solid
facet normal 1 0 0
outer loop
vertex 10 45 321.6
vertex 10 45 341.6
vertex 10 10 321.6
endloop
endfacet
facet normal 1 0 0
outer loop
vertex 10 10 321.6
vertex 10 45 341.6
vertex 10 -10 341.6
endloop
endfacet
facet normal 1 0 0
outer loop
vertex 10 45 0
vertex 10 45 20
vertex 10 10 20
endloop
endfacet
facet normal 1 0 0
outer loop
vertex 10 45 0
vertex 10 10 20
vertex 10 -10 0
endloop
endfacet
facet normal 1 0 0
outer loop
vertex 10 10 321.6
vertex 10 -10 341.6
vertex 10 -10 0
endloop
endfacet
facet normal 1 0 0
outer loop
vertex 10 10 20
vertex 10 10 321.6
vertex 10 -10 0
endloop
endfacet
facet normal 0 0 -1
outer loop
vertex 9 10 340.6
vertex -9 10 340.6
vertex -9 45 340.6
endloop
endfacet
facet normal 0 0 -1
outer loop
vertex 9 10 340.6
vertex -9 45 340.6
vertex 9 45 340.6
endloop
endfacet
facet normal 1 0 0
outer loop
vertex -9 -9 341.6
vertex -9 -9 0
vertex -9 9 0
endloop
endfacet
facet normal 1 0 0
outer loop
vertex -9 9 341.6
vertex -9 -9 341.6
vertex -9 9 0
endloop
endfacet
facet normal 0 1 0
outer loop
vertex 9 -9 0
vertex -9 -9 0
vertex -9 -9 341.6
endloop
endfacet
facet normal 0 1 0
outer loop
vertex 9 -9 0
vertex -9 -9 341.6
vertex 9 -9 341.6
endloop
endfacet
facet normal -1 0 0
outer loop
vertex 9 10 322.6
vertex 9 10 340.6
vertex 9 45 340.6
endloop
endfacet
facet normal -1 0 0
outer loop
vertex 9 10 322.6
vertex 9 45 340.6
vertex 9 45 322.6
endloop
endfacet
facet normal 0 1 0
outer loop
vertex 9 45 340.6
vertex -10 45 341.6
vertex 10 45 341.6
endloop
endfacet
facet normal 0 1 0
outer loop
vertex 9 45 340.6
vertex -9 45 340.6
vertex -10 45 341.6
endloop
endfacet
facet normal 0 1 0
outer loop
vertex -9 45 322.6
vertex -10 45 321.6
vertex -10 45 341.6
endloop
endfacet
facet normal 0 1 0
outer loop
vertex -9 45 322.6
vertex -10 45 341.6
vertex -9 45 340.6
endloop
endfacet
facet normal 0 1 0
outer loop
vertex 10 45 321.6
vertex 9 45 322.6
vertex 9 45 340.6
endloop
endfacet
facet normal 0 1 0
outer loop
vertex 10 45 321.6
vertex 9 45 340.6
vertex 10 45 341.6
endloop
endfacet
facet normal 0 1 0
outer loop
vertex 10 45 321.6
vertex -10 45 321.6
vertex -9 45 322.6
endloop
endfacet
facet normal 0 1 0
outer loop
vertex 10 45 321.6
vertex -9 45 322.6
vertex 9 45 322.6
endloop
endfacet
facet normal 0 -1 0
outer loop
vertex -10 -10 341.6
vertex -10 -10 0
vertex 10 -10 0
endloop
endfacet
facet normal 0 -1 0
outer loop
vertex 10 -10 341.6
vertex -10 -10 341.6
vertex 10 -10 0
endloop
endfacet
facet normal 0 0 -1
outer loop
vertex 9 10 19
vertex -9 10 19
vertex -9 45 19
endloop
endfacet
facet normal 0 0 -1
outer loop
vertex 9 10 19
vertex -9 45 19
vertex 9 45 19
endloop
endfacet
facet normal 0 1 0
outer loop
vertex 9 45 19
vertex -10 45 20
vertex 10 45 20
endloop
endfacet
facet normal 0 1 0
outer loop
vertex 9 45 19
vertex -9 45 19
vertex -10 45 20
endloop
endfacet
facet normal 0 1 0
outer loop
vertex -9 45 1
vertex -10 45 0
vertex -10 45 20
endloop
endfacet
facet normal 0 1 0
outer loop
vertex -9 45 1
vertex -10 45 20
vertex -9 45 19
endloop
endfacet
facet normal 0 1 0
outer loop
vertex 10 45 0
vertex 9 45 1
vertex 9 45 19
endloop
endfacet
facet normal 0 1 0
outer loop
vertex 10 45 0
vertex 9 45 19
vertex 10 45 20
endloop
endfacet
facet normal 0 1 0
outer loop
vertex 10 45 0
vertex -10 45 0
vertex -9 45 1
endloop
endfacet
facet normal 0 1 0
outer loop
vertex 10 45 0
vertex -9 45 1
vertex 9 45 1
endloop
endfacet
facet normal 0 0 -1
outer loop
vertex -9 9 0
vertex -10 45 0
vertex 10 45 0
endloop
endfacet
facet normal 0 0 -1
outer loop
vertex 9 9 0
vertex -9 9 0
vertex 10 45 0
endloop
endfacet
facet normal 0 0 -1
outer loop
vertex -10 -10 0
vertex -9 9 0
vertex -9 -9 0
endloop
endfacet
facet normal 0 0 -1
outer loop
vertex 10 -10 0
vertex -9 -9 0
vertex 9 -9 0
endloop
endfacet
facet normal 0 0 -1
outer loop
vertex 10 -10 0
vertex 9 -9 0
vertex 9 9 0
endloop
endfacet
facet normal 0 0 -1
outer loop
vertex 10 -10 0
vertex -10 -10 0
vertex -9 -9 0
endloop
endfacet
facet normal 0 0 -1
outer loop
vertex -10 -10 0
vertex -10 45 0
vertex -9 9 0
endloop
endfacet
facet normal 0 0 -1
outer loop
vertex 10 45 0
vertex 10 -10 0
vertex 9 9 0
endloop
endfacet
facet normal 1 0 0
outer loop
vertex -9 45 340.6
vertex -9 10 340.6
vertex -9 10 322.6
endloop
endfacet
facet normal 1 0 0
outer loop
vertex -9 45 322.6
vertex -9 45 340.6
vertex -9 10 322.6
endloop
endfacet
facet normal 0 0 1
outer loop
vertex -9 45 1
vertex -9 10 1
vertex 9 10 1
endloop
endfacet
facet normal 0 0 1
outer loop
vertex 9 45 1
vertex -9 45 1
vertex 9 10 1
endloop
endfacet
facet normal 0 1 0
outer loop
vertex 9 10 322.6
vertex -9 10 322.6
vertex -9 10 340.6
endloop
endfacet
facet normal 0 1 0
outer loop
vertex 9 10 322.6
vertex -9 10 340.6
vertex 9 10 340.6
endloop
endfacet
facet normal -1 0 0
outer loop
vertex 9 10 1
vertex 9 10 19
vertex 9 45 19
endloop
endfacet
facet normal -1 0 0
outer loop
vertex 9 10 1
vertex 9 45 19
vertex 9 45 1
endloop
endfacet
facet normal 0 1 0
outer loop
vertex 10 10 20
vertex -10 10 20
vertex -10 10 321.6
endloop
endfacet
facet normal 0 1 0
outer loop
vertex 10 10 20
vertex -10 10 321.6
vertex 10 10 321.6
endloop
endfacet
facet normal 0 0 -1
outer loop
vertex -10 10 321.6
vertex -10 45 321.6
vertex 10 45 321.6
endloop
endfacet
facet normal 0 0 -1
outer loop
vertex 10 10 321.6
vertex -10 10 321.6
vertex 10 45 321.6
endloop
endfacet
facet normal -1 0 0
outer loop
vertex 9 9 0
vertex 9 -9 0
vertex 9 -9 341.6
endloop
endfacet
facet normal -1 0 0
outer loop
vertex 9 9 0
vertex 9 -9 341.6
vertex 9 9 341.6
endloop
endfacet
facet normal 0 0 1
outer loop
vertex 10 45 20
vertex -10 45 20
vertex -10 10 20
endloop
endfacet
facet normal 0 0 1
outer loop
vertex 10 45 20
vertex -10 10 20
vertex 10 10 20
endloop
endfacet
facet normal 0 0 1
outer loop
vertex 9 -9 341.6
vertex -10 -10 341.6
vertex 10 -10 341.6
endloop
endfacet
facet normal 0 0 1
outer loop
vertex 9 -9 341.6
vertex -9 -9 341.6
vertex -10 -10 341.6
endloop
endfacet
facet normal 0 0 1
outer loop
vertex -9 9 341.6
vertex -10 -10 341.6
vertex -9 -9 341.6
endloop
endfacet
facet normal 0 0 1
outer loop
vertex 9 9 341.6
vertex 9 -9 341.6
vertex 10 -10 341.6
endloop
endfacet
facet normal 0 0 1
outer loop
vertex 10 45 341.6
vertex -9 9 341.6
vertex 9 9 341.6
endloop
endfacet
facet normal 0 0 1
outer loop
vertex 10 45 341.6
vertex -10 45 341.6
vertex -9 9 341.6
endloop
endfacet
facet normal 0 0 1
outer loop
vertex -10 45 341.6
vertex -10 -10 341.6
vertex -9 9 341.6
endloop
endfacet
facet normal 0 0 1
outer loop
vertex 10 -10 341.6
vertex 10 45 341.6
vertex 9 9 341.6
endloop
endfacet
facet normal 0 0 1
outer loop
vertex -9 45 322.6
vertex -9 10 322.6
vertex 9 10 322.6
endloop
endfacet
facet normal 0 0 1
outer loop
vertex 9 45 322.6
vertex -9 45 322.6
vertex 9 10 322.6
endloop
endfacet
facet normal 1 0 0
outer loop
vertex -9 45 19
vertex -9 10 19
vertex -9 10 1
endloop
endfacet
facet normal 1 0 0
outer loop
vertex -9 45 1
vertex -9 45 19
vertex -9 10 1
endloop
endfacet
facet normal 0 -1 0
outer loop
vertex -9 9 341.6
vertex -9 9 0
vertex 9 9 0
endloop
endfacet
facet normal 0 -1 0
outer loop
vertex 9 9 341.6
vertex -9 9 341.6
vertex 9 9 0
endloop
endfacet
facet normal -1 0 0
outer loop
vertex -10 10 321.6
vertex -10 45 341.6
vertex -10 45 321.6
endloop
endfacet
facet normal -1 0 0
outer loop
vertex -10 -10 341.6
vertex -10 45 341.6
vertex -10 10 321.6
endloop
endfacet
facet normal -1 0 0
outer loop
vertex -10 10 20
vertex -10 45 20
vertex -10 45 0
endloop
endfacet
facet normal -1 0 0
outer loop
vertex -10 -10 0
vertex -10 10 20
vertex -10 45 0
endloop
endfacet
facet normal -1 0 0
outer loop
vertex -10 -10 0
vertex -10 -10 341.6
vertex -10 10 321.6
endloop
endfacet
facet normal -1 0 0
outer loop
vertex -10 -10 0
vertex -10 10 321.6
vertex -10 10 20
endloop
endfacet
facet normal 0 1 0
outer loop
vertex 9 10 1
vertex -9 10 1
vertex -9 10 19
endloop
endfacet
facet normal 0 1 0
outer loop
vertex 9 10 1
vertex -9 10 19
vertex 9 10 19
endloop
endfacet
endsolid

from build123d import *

# Parameters (mm, degrees)
SKETCH2_W           = 20
SKETCH2_H           = 20
SKETCH2_W_2         = 18
SKETCH2_H_2         = 18
BOSS_EXTRUDE1_DEPTH = 341.6
SKETCH3_W           = 20
SKETCH3_H           = 20
SKETCH3_W_2         = 18
SKETCH3_H_2         = 18
BOSS_EXTRUDE2_DEPTH = 35


with BuildPart() as part:
    # Sketch2 → Boss-Extrude1 (new body)
    with BuildSketch(Plane.XY):
        Rectangle(SKETCH2_W, SKETCH2_H)
        Rectangle(SKETCH2_W_2, SKETCH2_H_2, mode=Mode.SUBTRACT)
    extrude(amount=BOSS_EXTRUDE1_DEPTH)

    # Sketch3 → Boss-Extrude2 (add)
    with BuildSketch(Plane(origin=(0, 10, 0), x_dir=(1, 0, 0), z_dir=(0, 1, 0))):
        with Locations((0, -10)):
            Rectangle(SKETCH3_W, SKETCH3_H)
        with Locations((0, -10)):
            Rectangle(SKETCH3_W_2, SKETCH3_H_2, mode=Mode.SUBTRACT)
        with Locations((0, -331.6)):
            Rectangle(SKETCH3_W, SKETCH3_H)
        with Locations((0, -331.6)):
            Rectangle(SKETCH3_W_2, SKETCH3_H_2, mode=Mode.SUBTRACT)
    extrude(amount=BOSS_EXTRUDE2_DEPTH)


solid = part.part
